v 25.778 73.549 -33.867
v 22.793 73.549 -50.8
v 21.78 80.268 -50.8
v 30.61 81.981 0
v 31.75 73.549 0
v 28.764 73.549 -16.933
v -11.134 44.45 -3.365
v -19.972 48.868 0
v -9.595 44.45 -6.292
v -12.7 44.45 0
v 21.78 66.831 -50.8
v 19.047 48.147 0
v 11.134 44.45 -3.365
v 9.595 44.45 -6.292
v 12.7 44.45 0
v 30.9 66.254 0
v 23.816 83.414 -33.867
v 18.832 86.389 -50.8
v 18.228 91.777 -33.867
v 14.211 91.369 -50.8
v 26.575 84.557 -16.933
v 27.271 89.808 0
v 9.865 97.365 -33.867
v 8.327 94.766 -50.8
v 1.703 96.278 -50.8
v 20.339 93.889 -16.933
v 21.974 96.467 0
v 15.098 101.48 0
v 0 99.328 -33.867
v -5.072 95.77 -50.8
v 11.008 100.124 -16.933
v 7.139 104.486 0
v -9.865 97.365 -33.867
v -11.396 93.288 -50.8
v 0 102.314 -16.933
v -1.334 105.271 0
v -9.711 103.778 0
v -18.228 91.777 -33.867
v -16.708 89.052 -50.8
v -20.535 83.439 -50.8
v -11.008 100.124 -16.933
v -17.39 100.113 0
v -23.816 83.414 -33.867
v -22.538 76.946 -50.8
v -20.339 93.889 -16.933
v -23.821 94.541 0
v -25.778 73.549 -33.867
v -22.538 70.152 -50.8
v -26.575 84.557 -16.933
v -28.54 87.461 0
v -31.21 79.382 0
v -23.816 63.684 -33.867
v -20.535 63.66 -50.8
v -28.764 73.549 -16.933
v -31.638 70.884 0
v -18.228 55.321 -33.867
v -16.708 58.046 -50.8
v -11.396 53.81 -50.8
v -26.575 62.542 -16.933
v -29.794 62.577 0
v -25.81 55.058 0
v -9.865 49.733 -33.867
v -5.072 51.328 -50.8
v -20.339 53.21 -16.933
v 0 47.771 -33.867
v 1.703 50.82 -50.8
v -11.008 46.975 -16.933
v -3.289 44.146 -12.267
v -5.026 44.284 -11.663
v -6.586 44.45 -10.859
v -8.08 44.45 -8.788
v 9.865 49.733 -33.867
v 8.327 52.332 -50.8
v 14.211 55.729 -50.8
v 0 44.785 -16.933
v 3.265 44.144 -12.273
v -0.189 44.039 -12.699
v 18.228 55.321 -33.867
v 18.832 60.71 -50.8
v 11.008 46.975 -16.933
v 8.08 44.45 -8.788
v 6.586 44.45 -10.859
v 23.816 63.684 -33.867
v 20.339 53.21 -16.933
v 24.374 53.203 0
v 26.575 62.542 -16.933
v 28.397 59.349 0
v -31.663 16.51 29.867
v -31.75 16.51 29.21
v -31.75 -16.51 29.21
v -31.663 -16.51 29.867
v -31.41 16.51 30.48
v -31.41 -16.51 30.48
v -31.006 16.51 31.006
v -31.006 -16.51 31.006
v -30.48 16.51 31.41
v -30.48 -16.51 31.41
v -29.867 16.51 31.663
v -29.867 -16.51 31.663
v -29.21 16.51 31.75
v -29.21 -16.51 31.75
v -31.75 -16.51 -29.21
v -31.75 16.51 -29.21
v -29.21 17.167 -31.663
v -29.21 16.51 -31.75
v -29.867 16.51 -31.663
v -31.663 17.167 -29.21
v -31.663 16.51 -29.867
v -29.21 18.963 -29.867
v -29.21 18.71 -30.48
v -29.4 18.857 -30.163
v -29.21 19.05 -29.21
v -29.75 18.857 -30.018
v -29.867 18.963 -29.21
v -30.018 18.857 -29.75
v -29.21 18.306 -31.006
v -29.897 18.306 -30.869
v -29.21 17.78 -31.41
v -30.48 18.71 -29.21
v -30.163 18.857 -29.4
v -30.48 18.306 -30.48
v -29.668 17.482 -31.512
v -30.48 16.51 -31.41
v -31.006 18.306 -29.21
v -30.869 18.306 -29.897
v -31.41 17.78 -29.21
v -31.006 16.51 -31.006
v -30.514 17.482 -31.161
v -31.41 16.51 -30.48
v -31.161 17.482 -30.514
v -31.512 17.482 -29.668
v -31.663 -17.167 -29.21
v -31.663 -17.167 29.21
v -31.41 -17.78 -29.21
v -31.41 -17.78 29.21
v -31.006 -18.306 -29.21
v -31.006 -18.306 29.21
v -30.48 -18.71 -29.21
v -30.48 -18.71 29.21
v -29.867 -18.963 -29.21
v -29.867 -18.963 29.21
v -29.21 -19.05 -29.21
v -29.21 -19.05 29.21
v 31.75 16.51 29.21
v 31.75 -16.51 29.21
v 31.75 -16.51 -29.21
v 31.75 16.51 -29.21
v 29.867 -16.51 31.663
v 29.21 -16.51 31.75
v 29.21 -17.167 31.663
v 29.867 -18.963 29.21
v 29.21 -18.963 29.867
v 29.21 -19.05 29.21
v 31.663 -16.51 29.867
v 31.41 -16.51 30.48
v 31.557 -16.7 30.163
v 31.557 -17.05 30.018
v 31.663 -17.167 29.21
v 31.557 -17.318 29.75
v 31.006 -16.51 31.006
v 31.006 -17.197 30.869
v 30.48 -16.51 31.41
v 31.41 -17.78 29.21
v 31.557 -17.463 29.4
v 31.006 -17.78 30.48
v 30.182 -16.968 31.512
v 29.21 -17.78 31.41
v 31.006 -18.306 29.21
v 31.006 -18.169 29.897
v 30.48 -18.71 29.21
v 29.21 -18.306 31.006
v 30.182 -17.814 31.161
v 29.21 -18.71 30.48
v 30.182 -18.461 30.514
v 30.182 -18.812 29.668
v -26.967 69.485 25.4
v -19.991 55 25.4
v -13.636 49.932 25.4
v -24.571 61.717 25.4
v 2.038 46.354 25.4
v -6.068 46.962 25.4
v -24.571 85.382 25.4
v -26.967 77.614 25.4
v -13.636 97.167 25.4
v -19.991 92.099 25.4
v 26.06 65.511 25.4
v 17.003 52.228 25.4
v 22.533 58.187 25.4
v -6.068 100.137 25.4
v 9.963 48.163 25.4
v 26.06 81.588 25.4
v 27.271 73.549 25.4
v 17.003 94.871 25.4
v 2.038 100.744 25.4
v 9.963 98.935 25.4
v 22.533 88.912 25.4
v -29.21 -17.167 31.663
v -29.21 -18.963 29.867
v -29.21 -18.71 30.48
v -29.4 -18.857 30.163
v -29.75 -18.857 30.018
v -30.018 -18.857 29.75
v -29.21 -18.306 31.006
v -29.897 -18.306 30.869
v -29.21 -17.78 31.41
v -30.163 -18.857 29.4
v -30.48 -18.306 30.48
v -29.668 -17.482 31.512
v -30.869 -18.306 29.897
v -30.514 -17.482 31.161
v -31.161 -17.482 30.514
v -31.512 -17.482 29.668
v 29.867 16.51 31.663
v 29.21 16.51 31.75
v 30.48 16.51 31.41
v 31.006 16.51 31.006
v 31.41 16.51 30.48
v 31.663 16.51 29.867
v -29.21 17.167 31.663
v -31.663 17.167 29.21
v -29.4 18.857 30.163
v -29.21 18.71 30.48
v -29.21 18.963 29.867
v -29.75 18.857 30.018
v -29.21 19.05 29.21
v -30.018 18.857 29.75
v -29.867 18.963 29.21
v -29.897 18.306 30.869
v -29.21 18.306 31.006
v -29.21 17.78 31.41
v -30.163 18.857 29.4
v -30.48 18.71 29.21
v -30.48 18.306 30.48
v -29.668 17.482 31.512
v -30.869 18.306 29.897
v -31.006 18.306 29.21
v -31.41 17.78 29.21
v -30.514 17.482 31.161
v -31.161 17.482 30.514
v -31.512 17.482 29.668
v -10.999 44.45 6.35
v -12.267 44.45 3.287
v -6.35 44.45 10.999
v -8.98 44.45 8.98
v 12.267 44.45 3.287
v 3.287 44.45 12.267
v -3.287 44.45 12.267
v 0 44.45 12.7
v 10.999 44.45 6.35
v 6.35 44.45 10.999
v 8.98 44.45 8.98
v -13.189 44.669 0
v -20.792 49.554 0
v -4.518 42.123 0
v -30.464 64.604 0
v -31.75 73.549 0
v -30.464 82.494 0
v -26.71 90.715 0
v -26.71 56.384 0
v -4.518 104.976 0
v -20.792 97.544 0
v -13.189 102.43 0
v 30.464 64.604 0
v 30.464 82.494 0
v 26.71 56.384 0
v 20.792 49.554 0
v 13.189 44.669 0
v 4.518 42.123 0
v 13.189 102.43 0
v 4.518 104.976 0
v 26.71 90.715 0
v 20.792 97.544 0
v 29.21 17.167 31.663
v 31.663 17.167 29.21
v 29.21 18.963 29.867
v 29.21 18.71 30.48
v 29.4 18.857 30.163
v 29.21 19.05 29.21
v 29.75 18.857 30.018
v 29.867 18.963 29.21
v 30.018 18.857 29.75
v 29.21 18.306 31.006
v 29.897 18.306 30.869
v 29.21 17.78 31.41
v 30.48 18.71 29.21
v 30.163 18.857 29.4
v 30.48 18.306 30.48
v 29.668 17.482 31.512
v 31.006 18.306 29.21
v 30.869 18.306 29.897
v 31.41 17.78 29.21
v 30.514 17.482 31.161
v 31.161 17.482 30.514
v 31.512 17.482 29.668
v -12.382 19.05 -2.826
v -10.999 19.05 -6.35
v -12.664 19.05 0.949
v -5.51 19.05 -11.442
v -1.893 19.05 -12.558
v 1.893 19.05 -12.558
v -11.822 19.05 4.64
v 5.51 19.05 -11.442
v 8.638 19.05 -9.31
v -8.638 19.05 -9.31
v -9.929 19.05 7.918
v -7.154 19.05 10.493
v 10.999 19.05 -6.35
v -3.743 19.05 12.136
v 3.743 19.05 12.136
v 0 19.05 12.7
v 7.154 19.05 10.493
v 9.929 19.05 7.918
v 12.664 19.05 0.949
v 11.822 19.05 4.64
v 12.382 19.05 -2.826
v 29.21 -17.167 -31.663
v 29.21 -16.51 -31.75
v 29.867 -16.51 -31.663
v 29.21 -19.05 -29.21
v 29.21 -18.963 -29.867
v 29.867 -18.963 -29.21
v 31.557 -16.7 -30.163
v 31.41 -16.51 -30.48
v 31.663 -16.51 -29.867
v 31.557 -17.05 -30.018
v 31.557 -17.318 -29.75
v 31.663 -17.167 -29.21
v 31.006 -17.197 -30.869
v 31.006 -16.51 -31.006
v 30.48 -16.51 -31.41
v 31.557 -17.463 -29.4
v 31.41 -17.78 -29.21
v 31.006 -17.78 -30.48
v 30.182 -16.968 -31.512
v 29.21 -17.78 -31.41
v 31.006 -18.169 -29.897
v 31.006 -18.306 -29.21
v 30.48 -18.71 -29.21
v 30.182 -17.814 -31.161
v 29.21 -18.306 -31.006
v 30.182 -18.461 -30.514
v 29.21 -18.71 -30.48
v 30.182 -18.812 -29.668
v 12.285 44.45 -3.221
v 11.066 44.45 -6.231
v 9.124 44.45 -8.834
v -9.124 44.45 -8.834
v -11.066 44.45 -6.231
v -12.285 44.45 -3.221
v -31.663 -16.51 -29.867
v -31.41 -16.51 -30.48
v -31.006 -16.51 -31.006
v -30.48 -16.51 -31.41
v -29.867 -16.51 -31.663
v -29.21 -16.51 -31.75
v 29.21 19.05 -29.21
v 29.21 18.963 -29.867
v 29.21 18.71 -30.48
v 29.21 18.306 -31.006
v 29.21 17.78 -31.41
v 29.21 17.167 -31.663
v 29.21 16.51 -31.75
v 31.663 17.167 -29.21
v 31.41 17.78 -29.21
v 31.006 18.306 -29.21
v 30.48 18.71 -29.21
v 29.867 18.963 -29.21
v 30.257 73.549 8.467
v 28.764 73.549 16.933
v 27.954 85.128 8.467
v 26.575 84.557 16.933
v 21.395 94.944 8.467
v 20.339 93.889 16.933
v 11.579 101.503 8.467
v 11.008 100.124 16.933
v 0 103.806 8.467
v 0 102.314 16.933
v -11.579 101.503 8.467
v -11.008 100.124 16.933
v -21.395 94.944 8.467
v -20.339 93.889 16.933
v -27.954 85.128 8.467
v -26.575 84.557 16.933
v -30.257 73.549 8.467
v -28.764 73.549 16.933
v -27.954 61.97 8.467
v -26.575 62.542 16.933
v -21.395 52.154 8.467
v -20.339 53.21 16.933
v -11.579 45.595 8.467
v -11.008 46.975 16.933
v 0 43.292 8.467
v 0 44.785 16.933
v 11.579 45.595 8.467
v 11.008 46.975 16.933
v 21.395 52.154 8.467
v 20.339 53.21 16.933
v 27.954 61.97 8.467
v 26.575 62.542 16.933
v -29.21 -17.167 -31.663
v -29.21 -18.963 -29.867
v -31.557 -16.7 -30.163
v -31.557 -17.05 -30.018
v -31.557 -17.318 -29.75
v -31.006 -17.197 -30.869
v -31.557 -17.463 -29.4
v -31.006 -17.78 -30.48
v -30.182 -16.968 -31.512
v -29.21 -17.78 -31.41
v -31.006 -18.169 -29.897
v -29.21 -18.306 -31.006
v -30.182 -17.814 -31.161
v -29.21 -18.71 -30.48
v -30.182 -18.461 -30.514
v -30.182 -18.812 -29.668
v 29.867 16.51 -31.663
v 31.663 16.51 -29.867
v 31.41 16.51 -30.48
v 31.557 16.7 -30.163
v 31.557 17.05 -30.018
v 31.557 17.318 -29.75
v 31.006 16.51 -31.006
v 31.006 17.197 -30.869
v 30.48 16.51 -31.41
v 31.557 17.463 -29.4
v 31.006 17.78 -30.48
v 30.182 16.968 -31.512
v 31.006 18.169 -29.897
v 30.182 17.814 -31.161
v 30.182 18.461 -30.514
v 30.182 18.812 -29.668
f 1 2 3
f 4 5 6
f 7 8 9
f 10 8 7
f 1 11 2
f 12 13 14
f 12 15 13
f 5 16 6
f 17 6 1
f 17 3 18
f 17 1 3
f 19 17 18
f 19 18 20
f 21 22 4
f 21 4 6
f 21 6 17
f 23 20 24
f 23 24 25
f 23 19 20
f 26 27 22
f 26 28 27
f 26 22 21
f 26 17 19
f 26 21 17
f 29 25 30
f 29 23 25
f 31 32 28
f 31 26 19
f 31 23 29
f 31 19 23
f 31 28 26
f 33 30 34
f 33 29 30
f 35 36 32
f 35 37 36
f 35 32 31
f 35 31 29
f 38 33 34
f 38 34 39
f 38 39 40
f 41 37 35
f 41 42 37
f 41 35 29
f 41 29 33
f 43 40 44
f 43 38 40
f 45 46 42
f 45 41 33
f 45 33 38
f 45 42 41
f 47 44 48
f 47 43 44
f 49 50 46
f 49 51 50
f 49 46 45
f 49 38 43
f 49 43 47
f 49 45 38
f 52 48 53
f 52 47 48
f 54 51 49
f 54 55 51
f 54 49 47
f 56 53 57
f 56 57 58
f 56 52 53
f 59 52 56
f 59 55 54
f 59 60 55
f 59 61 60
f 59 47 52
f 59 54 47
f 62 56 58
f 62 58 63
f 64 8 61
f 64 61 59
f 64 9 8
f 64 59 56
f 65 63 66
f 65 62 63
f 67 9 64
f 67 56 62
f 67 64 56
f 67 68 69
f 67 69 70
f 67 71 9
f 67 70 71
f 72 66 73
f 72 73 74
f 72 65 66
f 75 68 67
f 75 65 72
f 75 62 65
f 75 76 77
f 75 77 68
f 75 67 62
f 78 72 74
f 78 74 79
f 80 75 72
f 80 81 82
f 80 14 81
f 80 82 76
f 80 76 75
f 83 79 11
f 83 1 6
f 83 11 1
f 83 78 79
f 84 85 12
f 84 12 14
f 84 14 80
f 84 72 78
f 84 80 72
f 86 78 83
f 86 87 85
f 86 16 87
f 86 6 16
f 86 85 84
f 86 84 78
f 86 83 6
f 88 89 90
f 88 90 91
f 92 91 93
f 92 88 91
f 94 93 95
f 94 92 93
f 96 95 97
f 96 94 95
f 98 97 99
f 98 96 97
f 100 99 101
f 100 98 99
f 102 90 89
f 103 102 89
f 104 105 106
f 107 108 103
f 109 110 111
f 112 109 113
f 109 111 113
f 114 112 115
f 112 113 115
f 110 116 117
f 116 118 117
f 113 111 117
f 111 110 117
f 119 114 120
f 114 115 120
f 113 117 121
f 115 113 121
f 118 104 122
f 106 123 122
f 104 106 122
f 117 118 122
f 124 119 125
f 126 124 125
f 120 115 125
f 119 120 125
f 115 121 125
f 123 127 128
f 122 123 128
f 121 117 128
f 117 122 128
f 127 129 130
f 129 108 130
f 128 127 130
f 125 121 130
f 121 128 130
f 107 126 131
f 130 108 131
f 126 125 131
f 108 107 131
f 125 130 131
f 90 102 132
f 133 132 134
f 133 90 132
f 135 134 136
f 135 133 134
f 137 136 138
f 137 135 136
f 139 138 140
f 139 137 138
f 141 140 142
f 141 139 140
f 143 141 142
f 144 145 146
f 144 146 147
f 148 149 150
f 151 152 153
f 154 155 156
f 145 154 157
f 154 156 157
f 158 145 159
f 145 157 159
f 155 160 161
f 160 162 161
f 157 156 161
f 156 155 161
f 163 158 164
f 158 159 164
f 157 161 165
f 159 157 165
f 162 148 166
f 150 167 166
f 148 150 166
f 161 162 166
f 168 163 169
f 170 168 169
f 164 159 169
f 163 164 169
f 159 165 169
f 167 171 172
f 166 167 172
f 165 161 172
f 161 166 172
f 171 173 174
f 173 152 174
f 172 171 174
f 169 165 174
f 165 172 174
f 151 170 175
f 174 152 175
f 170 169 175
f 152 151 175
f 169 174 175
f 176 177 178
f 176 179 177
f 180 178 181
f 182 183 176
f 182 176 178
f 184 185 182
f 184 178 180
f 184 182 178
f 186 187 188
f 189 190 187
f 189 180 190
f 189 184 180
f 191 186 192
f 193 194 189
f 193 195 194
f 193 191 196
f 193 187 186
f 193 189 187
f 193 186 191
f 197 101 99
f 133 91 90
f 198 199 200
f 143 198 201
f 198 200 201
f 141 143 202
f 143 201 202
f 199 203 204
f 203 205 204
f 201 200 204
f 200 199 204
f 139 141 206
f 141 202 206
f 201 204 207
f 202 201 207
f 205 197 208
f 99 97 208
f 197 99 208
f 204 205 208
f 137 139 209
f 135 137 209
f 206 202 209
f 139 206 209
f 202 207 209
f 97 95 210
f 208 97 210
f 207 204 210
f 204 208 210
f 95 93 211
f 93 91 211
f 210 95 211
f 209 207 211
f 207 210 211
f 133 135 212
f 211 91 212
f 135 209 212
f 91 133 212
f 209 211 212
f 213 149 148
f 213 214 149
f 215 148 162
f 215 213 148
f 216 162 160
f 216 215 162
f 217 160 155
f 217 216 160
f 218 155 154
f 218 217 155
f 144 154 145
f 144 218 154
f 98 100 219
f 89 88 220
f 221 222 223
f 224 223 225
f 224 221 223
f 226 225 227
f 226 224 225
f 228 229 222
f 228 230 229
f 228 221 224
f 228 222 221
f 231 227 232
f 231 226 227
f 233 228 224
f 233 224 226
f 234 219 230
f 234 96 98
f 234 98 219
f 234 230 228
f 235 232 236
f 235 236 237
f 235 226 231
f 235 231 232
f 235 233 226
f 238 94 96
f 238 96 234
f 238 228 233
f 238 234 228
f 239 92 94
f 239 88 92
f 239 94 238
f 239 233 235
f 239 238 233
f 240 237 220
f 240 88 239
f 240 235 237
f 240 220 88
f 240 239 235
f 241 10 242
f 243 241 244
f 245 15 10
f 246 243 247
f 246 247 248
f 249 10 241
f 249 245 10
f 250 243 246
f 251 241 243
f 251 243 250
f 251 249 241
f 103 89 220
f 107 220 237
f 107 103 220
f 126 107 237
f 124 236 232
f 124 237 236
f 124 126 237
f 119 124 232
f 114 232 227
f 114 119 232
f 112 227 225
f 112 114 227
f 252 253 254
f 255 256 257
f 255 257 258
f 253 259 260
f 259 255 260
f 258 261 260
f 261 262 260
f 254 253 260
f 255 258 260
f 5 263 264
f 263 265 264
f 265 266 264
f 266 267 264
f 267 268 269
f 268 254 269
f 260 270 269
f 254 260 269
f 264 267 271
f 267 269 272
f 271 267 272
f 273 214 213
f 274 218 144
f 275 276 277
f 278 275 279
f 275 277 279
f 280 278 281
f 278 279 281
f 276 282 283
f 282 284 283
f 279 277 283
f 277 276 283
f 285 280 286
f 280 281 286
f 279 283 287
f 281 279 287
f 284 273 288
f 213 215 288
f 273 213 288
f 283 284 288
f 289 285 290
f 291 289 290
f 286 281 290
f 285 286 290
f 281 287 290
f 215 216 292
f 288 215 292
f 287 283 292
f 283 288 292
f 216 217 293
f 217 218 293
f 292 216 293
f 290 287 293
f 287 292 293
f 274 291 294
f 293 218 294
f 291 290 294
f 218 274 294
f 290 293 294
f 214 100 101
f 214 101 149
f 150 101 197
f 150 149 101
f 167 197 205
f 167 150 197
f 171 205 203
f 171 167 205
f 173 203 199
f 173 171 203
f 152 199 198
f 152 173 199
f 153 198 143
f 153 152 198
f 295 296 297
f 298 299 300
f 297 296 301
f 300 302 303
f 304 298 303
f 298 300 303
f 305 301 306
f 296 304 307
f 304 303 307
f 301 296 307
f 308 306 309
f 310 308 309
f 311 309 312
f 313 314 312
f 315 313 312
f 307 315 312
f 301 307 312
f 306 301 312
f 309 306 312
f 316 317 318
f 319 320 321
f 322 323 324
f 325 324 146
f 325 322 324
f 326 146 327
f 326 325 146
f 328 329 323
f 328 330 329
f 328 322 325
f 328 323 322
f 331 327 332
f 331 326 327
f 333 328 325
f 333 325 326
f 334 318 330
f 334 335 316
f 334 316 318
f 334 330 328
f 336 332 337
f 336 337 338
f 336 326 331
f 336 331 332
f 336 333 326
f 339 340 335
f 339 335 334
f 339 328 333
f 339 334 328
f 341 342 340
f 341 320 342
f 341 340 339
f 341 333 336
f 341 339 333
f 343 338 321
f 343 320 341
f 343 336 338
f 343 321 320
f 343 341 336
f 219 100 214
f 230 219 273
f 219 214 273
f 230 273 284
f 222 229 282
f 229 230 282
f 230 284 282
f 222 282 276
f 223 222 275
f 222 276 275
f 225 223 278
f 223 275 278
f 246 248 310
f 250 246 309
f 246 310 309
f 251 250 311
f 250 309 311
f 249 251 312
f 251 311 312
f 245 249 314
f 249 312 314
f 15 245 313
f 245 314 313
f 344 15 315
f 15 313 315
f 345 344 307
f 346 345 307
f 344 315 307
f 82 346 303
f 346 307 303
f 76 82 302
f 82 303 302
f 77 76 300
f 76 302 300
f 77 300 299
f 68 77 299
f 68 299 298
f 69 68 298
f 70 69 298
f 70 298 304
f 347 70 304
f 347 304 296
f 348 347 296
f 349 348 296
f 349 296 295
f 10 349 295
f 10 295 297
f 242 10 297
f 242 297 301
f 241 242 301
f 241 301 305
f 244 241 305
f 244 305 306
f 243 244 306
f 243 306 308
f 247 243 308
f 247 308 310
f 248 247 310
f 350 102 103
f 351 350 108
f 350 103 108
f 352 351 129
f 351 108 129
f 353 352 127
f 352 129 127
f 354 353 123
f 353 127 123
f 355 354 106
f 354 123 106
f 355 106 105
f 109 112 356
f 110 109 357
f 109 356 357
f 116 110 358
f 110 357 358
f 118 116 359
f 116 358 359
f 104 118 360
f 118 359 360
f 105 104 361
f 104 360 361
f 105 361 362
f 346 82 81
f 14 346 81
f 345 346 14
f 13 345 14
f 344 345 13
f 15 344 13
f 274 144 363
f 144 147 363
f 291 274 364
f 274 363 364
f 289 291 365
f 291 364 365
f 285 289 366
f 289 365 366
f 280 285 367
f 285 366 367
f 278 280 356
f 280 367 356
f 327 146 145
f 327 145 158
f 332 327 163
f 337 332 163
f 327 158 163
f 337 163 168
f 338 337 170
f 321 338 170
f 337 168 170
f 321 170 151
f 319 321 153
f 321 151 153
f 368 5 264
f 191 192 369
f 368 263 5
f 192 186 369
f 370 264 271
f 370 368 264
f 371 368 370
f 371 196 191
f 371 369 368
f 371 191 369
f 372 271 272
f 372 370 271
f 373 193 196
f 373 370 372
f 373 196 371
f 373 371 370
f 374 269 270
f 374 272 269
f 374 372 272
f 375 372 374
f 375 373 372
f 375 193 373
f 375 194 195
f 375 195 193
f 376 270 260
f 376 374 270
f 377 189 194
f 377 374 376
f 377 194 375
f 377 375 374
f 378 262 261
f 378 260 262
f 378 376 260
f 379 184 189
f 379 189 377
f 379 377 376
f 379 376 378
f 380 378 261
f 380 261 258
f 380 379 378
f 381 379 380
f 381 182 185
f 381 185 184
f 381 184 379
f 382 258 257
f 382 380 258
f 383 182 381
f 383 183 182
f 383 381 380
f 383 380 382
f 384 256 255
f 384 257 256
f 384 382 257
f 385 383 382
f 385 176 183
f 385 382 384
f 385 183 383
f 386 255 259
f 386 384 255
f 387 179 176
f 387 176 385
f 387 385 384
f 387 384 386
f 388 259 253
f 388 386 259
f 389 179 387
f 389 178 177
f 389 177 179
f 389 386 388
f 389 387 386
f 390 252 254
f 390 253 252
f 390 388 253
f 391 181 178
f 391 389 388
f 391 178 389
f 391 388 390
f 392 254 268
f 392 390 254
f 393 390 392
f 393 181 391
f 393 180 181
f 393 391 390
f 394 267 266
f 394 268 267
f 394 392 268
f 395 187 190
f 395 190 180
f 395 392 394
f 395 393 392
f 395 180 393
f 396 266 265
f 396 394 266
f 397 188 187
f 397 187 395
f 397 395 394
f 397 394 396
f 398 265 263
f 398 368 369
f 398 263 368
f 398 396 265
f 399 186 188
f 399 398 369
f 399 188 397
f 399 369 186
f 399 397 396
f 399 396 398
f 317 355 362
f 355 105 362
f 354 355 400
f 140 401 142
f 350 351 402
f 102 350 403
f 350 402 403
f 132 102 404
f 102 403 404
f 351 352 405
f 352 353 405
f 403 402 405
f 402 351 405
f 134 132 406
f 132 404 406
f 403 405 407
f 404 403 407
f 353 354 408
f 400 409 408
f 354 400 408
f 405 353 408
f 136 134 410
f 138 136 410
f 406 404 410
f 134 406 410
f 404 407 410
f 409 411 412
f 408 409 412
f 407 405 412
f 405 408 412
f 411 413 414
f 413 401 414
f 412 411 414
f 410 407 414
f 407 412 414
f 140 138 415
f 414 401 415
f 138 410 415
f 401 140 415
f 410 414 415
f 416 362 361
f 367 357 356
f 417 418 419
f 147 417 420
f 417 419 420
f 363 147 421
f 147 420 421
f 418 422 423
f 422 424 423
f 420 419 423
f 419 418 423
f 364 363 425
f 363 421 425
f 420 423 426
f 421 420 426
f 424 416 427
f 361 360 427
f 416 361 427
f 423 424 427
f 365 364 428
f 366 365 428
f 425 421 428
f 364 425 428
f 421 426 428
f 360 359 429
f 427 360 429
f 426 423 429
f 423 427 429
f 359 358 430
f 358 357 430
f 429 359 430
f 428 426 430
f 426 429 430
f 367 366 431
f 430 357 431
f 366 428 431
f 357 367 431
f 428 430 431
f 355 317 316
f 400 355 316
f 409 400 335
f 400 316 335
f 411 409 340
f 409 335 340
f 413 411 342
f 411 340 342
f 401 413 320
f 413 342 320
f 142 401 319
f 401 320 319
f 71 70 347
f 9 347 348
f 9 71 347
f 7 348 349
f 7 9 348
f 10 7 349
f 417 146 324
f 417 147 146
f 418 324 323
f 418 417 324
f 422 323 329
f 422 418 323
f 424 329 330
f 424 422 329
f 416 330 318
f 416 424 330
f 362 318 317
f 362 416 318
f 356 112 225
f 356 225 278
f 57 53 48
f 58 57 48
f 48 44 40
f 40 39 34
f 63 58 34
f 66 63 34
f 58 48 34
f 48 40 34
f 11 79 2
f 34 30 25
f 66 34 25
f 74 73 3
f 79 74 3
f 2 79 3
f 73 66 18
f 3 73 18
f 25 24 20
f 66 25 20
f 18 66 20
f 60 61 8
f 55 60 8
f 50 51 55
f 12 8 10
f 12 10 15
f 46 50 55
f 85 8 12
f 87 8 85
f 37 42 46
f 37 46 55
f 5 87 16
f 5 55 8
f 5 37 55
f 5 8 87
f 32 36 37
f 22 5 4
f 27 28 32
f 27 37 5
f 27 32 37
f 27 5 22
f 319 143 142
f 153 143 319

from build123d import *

# Parameters (mm, degrees)
SKETCH1_W           = 63.5
SKETCH1_H           = 38.1
BOSS_EXTRUDE1_DEPTH = 31.75
FILLET1_R           = 2.54
SKETCH2_R           = 12.7
BOSS_EXTRUDE2_DEPTH = 25.4
SKETCH3_R           = 31.75
BOSS_EXTRUDE3_DEPTH = 50.8
BOSS_EXTRUDE3_DRAFT = -10
SKETCH4_R           = 31.75
BOSS_EXTRUDE4_DEPTH = 25.4
BOSS_EXTRUDE4_TAPER = 10


with BuildPart() as part:
    # Sketch1 → Boss-Extrude1 (new, symmetric)
    with BuildSketch(Plane.XY):
        Rectangle(SKETCH1_W, SKETCH1_H)
    extrude(amount=BOSS_EXTRUDE1_DEPTH, both=True)

    # Fillet1
    fillet1_edges = [part.edges().sort_by_distance(p)[0] for p in [
        (-31.75, 0, 31.75),
        (0, -19.05, 31.75),
        (31.75, 0, 31.75),
        (0, -19.05, -31.75),
        (-31.75, 0, -31.75),
        (0, 19.05, -31.75),
        (31.75, 0, -31.75),
        (0, 19.05, 31.75),
        (31.75, -19.05, 0),
        (-31.75, -19.05, 0),
        (-31.75, 19.05, 0),
        (31.75, 19.05, 0),
    ]]
    fillet(fillet1_edges, radius=FILLET1_R)


with BuildPart() as body_2:
    # Sketch2 → Boss-Extrude2 (new body)
    with BuildSketch(Plane(origin=(0, 19.05, 0), x_dir=(-1, 0, 0), z_dir=(0, 1, 0))):
        with Locations(Location((0, 0, 0), (0, 0, 90))):
            Circle(SKETCH2_R)
    extrude(amount=BOSS_EXTRUDE2_DEPTH)


with BuildPart() as boss_extrude3_tool:
    # Sketch3 → Boss-Extrude3 (with draft: the straight prism first)
    with BuildSketch(Plane.XY):
        with Locations((0, 73.549355663)):
            Circle(SKETCH3_R)
    extrude(amount=-BOSS_EXTRUDE3_DEPTH)
    # Boss-Extrude3: the draft: its side faces are tilted about the plane it starts from
    boss_extrude3_sides = [boss_extrude3_tool.faces().sort_by_distance(p)[0] for p in [
        (-31.75, 73.549355663, -25.4),
    ]]
    draft(boss_extrude3_sides, Plane.XY, BOSS_EXTRUDE3_DRAFT)


with BuildPart() as body_2_1:
    add(body_2.part)

    # Boss-Extrude3: add boss_extrude3_tool
    add(boss_extrude3_tool.part)


with BuildPart() as body_3:
    # Sketch4 → Boss-Extrude4 (new body)
    with BuildSketch(Plane.XY):
        with Locations((0, 73.549355663)):
            Circle(SKETCH4_R)
    extrude(amount=BOSS_EXTRUDE4_DEPTH, taper=BOSS_EXTRUDE4_TAPER)


solid = Compound([part.part, body_2_1.part, body_3.part])
